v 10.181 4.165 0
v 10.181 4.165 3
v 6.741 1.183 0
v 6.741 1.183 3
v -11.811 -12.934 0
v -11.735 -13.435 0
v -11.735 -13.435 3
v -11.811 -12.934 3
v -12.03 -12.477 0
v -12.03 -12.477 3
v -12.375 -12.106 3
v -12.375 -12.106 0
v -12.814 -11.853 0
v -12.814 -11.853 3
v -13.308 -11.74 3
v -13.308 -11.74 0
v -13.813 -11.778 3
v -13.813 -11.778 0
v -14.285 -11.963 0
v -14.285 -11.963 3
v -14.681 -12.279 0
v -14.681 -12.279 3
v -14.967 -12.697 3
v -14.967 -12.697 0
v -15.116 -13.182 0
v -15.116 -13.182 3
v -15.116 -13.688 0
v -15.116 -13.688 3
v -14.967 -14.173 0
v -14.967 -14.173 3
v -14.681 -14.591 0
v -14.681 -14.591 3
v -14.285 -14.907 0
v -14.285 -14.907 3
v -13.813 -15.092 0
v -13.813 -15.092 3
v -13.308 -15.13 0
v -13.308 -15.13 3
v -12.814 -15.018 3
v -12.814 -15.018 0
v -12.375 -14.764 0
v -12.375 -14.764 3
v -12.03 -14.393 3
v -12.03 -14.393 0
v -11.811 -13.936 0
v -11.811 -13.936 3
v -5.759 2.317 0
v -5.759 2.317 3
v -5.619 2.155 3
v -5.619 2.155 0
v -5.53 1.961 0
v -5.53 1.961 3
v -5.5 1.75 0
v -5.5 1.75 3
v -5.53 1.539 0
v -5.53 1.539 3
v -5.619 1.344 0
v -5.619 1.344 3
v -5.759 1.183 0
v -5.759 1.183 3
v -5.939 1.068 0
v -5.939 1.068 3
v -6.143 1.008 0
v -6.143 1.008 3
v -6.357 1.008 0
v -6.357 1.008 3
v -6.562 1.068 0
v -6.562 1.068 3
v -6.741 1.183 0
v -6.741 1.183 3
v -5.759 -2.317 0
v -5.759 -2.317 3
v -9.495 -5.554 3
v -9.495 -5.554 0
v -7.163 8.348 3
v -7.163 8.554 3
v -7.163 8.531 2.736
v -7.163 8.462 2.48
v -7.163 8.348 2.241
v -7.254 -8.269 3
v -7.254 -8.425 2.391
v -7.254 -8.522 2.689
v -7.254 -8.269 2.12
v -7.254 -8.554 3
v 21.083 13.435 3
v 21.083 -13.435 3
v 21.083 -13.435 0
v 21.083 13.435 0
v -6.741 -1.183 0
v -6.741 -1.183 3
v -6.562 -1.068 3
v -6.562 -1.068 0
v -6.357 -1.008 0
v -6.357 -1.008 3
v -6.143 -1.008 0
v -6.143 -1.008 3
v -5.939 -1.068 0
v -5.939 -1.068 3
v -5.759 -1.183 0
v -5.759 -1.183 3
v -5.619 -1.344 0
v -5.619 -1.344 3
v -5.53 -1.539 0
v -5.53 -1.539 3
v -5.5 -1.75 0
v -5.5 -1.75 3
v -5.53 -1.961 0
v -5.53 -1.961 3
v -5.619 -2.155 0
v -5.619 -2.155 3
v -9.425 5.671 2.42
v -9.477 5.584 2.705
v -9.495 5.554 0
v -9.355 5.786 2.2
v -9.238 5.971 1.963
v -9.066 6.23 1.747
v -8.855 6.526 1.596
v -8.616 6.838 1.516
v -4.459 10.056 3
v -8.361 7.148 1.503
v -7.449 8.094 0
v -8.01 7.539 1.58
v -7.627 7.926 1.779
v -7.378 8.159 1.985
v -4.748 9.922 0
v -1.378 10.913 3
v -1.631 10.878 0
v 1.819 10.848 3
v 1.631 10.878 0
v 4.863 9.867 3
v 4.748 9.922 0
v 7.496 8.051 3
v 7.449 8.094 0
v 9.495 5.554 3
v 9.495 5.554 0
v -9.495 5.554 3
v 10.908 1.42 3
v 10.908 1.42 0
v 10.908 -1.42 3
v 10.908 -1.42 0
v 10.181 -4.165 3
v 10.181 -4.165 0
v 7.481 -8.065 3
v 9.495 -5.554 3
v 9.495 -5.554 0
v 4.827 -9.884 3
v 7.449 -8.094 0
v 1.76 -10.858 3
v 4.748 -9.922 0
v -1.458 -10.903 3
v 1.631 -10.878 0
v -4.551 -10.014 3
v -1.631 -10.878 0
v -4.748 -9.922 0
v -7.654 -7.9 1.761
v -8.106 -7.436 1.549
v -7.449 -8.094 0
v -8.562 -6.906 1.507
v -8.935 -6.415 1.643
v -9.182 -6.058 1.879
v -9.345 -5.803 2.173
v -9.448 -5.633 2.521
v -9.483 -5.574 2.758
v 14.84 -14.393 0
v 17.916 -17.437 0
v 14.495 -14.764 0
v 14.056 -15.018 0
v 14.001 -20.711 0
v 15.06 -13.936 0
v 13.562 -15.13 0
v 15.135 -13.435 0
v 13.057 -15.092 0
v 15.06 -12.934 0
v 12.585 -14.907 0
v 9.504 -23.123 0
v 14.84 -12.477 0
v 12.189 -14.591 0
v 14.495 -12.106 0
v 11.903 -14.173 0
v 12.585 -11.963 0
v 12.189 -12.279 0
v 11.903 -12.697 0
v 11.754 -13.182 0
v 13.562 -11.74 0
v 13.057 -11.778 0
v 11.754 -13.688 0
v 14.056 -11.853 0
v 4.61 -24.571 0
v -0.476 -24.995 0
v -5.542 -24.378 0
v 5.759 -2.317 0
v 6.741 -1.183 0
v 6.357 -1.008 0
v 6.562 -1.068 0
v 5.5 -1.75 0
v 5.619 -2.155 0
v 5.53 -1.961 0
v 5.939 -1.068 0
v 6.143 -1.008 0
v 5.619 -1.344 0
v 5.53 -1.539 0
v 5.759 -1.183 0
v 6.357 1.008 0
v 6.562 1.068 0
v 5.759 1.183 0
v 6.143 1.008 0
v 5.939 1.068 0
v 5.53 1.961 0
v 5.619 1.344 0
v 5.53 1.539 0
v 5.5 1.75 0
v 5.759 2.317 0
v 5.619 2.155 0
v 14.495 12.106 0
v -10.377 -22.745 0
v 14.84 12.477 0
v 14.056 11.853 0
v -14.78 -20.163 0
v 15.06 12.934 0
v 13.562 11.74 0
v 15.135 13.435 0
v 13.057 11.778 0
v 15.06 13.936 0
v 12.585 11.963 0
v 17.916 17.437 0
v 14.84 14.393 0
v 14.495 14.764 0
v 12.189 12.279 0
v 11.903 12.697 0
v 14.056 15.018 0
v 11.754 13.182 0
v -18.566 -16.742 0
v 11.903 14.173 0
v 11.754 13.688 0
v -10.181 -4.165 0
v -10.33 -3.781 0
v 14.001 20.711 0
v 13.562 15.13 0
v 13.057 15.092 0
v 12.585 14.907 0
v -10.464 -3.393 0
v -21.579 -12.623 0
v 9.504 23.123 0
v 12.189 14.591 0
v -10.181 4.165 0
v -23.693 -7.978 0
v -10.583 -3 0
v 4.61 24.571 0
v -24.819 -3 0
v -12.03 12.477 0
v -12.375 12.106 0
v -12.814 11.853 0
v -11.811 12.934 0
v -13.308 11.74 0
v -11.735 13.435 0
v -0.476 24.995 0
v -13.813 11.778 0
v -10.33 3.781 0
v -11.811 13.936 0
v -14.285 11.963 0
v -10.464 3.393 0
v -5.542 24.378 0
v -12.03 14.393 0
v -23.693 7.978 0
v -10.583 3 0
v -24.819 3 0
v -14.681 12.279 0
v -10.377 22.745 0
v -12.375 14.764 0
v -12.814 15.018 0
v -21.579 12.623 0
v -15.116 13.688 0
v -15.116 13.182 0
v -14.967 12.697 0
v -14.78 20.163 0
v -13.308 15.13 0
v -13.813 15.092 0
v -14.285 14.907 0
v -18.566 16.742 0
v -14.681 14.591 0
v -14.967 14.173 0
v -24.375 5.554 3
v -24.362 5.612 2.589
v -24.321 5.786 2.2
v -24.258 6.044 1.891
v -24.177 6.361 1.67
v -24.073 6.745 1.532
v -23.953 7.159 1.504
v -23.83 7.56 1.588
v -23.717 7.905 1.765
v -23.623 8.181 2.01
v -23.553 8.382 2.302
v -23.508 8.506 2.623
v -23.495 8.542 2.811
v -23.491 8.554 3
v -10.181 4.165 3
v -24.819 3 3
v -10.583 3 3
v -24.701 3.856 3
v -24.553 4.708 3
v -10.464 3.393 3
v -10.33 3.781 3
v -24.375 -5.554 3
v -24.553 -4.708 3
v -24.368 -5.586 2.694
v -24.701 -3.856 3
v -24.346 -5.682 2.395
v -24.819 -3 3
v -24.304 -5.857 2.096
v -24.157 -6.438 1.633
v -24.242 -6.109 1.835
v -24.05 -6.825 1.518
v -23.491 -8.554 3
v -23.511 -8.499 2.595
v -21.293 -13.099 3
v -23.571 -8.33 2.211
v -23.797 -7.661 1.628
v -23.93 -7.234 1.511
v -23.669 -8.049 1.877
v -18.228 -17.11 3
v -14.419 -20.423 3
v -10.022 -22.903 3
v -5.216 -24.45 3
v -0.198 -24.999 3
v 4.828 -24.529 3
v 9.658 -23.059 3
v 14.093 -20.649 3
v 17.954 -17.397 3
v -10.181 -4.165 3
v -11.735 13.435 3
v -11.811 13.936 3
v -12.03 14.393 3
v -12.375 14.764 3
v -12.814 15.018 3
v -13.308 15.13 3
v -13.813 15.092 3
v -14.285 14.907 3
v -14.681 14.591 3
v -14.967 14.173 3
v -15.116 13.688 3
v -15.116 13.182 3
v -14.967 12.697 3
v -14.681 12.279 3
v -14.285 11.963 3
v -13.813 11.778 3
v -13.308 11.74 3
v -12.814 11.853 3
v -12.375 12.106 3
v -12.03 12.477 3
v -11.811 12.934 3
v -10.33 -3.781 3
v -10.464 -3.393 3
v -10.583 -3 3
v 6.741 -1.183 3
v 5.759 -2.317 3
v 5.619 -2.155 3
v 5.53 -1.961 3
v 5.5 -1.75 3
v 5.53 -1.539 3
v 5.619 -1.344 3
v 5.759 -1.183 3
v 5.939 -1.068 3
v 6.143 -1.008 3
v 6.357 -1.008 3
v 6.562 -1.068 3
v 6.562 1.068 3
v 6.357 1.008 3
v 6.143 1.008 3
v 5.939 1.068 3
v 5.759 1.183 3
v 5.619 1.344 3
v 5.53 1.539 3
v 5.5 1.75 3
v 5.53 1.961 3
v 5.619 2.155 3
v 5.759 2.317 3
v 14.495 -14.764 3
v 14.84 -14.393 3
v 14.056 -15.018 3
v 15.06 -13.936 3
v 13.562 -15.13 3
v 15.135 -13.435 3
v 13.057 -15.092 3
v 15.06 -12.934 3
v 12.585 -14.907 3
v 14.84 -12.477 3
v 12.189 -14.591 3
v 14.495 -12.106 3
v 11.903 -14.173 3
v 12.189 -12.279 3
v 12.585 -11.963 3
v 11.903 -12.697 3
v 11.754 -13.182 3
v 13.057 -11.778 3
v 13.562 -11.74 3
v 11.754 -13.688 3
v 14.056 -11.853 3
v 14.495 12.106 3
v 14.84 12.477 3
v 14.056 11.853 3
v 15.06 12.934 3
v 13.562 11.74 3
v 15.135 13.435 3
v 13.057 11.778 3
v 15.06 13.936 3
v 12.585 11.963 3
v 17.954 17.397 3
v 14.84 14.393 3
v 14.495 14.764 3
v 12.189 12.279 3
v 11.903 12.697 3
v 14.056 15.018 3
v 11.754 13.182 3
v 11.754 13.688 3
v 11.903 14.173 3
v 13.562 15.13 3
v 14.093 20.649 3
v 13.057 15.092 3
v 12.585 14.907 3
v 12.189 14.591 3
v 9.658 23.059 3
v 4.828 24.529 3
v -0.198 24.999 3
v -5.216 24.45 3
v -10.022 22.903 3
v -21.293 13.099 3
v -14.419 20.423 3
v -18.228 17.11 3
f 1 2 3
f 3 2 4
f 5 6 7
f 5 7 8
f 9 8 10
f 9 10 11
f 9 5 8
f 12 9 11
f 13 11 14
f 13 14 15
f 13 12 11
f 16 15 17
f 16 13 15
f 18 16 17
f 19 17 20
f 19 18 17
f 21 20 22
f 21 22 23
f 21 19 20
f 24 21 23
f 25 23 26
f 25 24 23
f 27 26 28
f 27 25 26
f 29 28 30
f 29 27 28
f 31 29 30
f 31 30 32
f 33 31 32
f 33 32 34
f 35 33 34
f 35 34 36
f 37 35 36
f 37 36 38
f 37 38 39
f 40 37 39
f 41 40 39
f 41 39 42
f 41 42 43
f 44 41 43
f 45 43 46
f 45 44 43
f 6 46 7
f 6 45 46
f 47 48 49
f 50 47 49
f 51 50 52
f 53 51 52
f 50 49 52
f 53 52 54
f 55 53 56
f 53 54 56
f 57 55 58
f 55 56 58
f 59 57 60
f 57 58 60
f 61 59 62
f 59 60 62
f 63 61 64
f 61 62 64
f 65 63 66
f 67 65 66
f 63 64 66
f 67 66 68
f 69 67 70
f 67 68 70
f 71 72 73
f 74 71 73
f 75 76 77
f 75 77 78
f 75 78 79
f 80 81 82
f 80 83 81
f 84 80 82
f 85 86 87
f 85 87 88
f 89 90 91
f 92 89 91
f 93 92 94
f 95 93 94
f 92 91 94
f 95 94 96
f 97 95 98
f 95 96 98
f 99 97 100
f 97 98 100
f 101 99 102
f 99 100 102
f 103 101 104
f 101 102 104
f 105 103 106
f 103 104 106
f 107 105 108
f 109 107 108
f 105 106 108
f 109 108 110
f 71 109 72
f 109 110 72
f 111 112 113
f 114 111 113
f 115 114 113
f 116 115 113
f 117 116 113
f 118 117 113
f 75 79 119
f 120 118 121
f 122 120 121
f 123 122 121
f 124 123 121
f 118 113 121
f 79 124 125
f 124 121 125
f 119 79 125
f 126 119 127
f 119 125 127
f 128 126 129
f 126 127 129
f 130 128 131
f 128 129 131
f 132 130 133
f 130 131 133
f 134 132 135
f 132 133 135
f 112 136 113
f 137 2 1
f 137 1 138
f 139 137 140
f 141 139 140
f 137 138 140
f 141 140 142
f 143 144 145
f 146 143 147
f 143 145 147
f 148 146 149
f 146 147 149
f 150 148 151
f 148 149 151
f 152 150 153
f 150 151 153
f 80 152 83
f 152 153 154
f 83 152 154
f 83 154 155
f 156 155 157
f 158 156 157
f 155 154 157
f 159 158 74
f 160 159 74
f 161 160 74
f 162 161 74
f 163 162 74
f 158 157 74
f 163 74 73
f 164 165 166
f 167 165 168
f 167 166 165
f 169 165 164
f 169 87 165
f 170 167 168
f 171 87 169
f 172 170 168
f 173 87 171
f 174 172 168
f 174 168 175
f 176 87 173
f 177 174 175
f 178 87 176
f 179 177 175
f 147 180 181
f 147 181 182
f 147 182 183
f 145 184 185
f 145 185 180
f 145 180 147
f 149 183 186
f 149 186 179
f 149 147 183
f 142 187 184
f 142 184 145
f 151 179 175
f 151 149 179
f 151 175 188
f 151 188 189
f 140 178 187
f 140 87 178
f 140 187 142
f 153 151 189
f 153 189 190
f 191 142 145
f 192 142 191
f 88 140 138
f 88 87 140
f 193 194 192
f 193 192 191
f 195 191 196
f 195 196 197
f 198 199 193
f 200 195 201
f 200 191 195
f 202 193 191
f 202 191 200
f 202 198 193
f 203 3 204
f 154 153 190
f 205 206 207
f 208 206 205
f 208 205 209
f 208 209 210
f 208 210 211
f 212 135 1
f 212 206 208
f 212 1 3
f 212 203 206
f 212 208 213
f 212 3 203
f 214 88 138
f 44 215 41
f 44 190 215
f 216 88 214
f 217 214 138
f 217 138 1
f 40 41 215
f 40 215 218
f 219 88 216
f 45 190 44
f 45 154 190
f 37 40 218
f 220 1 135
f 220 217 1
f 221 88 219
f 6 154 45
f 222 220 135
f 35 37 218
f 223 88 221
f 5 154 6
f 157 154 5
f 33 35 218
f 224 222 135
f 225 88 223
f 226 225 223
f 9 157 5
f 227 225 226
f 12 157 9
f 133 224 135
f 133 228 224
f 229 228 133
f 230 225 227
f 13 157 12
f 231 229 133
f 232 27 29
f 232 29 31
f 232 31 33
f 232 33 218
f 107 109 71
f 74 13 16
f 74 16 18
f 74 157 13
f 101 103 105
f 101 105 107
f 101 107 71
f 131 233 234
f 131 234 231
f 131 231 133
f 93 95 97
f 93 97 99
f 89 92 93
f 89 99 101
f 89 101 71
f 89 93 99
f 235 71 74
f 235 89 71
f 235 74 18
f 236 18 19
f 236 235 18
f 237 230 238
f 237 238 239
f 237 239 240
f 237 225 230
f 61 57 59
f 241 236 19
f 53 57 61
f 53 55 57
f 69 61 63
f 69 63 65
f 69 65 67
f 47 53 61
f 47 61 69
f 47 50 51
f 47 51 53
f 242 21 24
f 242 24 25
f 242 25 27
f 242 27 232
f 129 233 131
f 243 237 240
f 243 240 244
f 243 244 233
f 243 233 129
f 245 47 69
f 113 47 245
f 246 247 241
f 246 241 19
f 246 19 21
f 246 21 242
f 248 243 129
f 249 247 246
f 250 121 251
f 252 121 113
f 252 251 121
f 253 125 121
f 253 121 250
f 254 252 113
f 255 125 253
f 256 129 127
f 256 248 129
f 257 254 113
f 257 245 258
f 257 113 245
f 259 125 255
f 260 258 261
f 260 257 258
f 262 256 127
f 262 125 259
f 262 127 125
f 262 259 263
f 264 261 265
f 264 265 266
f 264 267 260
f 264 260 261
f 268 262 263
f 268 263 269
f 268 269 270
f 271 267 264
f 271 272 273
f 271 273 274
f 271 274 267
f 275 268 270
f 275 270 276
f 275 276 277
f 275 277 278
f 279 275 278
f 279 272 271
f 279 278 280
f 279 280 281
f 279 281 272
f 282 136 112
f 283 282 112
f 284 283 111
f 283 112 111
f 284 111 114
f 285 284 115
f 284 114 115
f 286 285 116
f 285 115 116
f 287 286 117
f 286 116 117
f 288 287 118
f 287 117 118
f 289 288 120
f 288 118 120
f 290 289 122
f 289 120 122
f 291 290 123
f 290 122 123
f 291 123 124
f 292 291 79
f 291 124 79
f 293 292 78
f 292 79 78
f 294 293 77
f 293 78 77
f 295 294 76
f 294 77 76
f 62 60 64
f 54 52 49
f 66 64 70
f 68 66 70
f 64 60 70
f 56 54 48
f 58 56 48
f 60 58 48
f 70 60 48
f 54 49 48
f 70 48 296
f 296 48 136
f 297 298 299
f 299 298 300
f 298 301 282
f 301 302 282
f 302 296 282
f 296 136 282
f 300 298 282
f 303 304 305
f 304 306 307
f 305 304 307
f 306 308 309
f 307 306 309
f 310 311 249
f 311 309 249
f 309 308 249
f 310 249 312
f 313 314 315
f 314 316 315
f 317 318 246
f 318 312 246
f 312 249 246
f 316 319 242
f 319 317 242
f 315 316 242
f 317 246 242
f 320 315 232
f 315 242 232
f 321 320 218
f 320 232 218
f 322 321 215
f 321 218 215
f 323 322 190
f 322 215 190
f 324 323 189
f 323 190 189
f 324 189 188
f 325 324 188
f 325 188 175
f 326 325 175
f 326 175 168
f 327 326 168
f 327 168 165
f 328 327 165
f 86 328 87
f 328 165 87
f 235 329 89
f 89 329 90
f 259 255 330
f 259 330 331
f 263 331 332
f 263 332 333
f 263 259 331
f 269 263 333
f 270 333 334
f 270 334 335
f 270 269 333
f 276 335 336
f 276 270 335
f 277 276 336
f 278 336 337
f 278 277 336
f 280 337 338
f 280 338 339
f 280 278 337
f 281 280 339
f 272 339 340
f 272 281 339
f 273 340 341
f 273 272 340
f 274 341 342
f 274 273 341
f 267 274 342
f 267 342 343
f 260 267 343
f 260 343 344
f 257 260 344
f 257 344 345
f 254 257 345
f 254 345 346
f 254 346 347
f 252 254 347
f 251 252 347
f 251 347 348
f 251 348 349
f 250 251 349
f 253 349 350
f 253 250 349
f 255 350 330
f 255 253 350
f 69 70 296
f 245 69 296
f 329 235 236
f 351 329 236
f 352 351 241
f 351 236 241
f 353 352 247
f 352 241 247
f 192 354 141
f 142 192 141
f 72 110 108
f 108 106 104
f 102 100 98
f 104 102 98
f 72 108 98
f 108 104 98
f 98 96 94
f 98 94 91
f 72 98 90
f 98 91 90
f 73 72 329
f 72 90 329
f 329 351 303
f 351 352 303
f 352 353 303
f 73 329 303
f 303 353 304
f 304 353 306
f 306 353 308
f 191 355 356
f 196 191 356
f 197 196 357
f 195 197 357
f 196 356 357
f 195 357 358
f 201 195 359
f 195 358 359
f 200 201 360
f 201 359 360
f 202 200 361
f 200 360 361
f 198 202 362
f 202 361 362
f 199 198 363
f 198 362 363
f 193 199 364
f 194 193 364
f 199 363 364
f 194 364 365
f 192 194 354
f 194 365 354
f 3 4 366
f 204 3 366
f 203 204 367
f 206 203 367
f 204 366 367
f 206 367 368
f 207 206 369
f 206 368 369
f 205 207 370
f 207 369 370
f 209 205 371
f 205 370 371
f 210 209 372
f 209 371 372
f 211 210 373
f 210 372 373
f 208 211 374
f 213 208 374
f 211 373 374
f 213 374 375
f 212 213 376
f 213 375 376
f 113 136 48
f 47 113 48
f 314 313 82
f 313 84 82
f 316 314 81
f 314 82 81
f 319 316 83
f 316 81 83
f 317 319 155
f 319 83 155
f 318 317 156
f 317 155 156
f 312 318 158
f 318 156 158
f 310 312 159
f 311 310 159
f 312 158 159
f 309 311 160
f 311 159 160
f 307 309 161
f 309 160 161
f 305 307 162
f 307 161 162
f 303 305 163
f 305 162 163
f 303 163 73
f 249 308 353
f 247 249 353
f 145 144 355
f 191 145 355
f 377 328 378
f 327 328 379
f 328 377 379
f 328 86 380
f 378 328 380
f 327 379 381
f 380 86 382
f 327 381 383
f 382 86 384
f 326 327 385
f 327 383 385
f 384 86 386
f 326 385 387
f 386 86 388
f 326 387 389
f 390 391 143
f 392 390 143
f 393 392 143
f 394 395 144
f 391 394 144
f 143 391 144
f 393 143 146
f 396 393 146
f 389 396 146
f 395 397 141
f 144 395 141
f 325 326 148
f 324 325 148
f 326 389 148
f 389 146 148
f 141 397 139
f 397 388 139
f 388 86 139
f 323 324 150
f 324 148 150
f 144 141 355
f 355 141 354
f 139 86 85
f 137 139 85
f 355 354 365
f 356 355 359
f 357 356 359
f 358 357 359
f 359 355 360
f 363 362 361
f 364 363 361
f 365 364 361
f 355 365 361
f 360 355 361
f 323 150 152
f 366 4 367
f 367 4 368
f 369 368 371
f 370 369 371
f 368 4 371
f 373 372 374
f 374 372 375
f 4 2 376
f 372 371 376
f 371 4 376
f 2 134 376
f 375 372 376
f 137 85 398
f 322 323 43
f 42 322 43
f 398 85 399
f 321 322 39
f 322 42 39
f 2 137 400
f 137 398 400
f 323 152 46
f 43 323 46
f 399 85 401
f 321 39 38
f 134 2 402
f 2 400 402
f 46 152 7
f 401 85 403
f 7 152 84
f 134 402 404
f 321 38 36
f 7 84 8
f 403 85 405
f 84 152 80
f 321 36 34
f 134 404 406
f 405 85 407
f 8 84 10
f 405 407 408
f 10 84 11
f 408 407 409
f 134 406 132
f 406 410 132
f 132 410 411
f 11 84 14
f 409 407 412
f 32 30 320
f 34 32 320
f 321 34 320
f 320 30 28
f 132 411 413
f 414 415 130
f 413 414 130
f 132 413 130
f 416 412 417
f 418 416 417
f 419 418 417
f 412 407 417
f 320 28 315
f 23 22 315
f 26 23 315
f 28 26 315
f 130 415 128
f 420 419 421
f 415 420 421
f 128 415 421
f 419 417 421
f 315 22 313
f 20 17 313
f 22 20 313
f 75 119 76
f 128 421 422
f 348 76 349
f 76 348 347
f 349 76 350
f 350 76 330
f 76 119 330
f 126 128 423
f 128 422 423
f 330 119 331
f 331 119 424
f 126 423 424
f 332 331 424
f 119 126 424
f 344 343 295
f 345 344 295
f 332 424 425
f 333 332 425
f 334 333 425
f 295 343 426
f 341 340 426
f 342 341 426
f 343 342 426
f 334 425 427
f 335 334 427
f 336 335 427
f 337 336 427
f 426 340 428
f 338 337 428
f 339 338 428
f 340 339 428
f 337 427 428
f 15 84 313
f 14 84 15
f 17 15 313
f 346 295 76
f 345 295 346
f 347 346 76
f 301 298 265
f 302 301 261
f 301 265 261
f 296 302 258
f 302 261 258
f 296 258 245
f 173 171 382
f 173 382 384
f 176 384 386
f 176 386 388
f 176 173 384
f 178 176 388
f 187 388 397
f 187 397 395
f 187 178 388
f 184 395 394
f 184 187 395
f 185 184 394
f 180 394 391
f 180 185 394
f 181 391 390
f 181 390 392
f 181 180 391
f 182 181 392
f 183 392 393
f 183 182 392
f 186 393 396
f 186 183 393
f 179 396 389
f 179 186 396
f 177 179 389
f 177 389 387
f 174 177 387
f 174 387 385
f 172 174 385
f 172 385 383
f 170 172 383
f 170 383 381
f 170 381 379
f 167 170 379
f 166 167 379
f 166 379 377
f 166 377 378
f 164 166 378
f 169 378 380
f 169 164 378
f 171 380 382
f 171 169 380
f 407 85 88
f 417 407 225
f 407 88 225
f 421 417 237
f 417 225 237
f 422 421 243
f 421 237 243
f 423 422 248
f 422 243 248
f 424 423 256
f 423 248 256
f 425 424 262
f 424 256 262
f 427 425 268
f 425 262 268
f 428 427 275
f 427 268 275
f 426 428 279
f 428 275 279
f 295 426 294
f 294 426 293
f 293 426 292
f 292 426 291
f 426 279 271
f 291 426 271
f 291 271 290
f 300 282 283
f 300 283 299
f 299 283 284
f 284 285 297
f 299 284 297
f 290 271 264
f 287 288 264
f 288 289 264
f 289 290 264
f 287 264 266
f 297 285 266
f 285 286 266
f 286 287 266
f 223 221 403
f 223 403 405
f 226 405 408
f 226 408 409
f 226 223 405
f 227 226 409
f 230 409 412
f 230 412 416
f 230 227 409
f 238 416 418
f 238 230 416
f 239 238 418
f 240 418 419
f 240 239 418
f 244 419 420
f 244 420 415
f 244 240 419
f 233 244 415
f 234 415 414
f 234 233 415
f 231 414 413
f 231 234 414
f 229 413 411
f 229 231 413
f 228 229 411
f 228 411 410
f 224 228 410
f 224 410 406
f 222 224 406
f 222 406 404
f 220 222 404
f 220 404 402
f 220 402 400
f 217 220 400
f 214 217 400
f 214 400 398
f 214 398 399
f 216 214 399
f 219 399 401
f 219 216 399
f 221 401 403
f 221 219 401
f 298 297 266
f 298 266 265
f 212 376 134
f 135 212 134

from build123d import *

# Parameters (mm, degrees)
ESQUISSE1_R             = 25
ESQUISSE1_R_2           = 1.7
BOSS_EXTRU_1_DEPTH      = 3
ESQUISSE6_R             = 11
ENL_V_MAT_EXTRU_2_DEPTH = 36.482389998
BOSS_EXTRU_6_DEPTH      = 3
ESQUISSE11_W            = 18.64617436
ESQUISSE11_H            = 6
ENL_V_MAT_EXTRU_3_DEPTH = 36.482389998
ESQUISSE12_W            = 17.120822442
ESQUISSE12_H            = 1.5
ESQUISSE13_W            = 17.212222589
ESQUISSE13_H            = 1.5
ESQUISSE14_W            = 6.427132246
ESQUISSE14_H            = 29.186840833
ENL_V_MAT_EXTRU_4_DEPTH = 36.482390148


with BuildPart() as part:
    # Esquisse1 → Boss.-Extru.1 (new body)
    with BuildSketch(Plane.XY):
        Circle(ESQUISSE1_R)
        with Locations((-13.435028843, 13.435028843)):
            Circle(ESQUISSE1_R_2, mode=Mode.SUBTRACT)
        with Locations((13.435028843, 13.435028843)):
            Circle(ESQUISSE1_R_2, mode=Mode.SUBTRACT)
        with Locations((13.435028843, -13.435028843)):
            Circle(ESQUISSE1_R_2, mode=Mode.SUBTRACT)
        with Locations((-13.435028843, -13.435028843)):
            Circle(ESQUISSE1_R_2, mode=Mode.SUBTRACT)
    extrude(amount=BOSS_EXTRU_1_DEPTH)

    # Esquisse6 → Enlèv. mat.-Extru.2 (cut, through all)
    with BuildSketch(Plane(origin=(0, 0, 0), x_dir=(-1, 0, 0), z_dir=(0, 0, -1))):
        Circle(ESQUISSE6_R)
    extrude(amount=-ENL_V_MAT_EXTRU_2_DEPTH, mode=Mode.SUBTRACT)

    # Esquisse10 → Boss.-Extru.6 (add)
    with BuildSketch(Plane.XY.offset(3)):
        with BuildLine():
            Line((-5.758802096, -2.316766812), (-9.508802096, -5.566766812))
            ThreePointArc((-9.508802096, -5.566766812), (-10.566766812, -5.491197904), (-10.491197904, -4.433233188))
            Line((-10.491197904, -4.433233188), (-6.741197904, -1.183233188))
            ThreePointArc((-6.741197904, -1.183233188), (-5.683233188, -1.258802096), (-5.758802096, -2.316766812))
        make_face()
        with BuildLine():
            Line((-6.741197904, 1.183233188), (-10.491197904, 4.433233188))
            ThreePointArc((-10.491197904, 4.433233188), (-10.566766812, 5.491197904), (-9.508802096, 5.566766812))
            Line((-9.508802096, 5.566766812), (-5.758802096, 2.316766812))
            ThreePointArc((-5.758802096, 2.316766812), (-5.683233188, 1.258802096), (-6.741197904, 1.183233188))
        make_face()
        with BuildLine():
            Line((9.508802096, -5.566766812), (5.758802096, -2.316766812))
            ThreePointArc((5.758802096, -2.316766812), (5.683233188, -1.258802096), (6.741197904, -1.183233188))
            Line((6.741197904, -1.183233188), (10.491197904, -4.433233188))
            ThreePointArc((10.491197904, -4.433233188), (10.566766812, -5.491197904), (9.508802096, -5.566766812))
        make_face()
        with BuildLine():
            Line((10.491197904, 4.433233188), (6.741197904, 1.183233188))
            ThreePointArc((6.741197904, 1.183233188), (5.683233188, 1.258802096), (5.758802096, 2.316766812))
            Line((5.758802096, 2.316766812), (9.508802096, 5.566766812))
            ThreePointArc((9.508802096, 5.566766812), (10.566766812, 5.491197904), (10.491197904, 4.433233188))
        make_face()
    extrude(amount=-BOSS_EXTRU_6_DEPTH)

    # Esquisse11 → Enlèv. mat.-Extru.3 (cut, through all)
    with BuildSketch(Plane.XY.offset(3)):
        with Locations((-19.368578738, 0)):
            Rectangle(ESQUISSE11_W, ESQUISSE11_H)
    extrude(amount=-ENL_V_MAT_EXTRU_3_DEPTH, mode=Mode.SUBTRACT)

    # Esquisse12 → Enlèvement de matière-Révolution1 (revolve, cut)
    with BuildSketch(Plane.XY.offset(3)):
        with Locations((-15.814736021, -6.304475395)):
            Rectangle(ESQUISSE12_W, ESQUISSE12_H)
    revolve(axis=Axis((-24.375147242, -7.054475395, 3), (1, 0, 0)), mode=Mode.SUBTRACT)

    # Esquisse13 → Enlèvement de matière-Révolution2 (revolve, cut)
    with BuildSketch(Plane.XY.offset(3)):
        with Locations((-15.769035948, 6.304475395)):
            Rectangle(ESQUISSE13_W, ESQUISSE13_H)
    revolve(axis=Axis((-24.375147242, 7.054475395, 3), (1, 0, 0)), mode=Mode.SUBTRACT)

    # Esquisse14 → Enlèv. mat.-Extru.4 (cut, through all)
    with BuildSketch(Plane.XY.offset(3)):
        with Locations((24.296734765, 1.158391573)):
            Rectangle(ESQUISSE14_W, ESQUISSE14_H)
    extrude(amount=-ENL_V_MAT_EXTRU_4_DEPTH, mode=Mode.SUBTRACT)


solid = part.part
